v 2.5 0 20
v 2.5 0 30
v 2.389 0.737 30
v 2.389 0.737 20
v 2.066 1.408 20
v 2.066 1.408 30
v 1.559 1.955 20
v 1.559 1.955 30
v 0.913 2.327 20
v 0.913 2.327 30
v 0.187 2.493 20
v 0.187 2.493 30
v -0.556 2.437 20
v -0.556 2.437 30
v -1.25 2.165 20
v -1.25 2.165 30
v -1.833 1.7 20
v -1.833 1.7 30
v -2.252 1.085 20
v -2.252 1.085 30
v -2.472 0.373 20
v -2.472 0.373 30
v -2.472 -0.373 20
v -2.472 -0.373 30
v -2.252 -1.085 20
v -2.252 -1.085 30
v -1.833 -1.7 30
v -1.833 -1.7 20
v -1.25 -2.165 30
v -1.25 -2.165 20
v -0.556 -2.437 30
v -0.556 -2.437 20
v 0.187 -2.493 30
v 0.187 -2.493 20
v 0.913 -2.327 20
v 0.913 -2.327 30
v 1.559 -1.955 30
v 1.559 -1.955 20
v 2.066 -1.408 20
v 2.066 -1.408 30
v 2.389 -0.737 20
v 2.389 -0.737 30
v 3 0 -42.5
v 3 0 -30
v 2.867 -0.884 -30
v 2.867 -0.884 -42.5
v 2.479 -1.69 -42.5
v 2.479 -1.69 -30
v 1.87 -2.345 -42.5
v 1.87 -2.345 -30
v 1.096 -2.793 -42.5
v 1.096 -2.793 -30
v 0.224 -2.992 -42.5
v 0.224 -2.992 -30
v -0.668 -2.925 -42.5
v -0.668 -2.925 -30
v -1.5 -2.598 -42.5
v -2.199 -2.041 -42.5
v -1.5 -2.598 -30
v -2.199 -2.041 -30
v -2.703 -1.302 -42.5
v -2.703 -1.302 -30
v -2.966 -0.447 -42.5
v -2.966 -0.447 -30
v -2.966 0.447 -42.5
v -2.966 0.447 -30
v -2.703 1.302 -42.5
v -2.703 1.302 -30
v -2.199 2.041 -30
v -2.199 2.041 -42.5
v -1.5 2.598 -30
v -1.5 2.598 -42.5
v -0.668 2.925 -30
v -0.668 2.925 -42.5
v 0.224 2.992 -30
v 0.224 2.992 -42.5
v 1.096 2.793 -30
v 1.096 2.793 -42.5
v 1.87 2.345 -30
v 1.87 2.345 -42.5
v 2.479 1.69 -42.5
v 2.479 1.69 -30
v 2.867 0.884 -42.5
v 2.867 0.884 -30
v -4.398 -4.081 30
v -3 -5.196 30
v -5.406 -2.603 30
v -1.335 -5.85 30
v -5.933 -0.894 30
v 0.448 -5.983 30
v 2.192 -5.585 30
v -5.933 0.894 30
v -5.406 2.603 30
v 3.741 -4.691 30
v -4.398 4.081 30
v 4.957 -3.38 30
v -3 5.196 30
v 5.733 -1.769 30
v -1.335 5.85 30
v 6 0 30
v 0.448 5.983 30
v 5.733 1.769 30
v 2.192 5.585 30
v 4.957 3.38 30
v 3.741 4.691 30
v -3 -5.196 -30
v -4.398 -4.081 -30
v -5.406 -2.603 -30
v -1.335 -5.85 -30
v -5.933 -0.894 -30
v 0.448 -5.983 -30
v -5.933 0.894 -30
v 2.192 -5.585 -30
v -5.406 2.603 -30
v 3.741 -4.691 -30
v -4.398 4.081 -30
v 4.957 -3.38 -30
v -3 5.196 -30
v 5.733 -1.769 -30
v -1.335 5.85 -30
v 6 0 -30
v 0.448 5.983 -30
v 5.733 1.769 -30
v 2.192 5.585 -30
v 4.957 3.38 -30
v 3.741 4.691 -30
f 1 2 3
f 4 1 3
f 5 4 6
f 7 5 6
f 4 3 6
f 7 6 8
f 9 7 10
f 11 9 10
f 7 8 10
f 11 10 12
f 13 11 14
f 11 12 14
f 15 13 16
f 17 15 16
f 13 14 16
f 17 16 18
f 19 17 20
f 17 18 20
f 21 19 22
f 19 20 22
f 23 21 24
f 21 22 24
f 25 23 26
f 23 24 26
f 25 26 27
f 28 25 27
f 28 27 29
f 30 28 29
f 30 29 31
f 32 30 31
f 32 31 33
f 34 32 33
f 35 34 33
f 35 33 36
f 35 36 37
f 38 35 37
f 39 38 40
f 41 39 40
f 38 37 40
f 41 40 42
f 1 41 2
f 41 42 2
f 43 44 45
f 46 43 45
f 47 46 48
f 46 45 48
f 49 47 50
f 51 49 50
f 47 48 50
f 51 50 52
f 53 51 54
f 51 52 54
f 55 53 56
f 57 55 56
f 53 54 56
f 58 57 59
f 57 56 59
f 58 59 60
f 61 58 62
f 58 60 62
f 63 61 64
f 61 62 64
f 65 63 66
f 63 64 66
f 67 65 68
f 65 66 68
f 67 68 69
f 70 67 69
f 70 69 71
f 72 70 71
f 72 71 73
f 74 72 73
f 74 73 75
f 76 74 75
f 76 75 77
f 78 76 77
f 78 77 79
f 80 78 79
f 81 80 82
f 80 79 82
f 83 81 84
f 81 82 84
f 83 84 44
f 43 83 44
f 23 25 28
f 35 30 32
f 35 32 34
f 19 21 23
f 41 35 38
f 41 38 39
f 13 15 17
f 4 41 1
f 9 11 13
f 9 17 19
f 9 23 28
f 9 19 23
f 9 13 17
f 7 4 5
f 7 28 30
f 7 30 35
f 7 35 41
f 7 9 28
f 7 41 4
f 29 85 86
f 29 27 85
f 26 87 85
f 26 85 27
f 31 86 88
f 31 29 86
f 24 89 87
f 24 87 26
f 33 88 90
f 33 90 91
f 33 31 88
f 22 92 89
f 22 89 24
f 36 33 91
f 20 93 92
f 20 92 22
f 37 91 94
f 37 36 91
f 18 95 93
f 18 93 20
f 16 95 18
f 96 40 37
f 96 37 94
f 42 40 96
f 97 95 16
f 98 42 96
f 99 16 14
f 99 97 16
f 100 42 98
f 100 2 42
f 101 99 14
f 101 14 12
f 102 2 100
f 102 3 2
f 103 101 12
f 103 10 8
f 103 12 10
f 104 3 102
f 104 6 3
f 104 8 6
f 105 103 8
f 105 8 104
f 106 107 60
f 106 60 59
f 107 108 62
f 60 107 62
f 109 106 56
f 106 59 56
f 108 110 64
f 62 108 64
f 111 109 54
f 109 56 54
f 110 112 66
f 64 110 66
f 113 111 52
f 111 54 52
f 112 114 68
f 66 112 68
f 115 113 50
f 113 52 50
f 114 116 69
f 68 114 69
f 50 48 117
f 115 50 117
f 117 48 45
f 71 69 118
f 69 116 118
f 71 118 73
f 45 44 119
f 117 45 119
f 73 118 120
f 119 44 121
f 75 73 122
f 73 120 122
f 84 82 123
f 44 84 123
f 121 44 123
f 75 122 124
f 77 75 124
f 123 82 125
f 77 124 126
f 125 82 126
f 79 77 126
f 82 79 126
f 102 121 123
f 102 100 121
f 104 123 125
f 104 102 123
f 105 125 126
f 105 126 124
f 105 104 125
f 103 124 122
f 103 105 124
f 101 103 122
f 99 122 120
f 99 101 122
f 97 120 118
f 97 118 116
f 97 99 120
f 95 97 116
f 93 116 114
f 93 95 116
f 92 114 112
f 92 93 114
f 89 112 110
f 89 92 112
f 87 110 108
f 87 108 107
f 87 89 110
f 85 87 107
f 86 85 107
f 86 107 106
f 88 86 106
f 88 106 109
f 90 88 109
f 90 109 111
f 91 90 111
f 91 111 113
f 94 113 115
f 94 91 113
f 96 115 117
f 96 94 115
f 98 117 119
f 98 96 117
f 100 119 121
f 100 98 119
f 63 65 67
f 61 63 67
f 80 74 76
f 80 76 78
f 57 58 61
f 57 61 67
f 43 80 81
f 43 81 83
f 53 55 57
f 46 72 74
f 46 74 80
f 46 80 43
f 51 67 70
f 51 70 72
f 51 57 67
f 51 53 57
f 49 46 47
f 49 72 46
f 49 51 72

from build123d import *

# Parameters (mm, degrees)
SKETCH_1_R          = 6
EXTRUDE_1_DEPTH     = 30
SKETCH_2_R          = 3
EXTRUDE_2_DEPTH     = 12.5
SKETCH_4_R          = 2.5
CUT_EXTRUDE_1_DEPTH = 10


with BuildPart() as part:
    # 草图1 → 凸台-拉伸1 (new, symmetric)
    with BuildSketch(Plane.XY):
        Circle(SKETCH_1_R)
    extrude(amount=EXTRUDE_1_DEPTH, both=True)

    # 草图2 → 凸台-拉伸2 (add)
    with BuildSketch(Plane(origin=(0, 0, -30), x_dir=(-1, 0, 0), z_dir=(0, 0, -1))):
        with Locations(Location((0, 0, 0), (0, 0, 180))):
            Circle(SKETCH_2_R)
    extrude(amount=EXTRUDE_2_DEPTH)

    # 草图4 → 切除-拉伸1 (cut)
    with BuildSketch(Plane.XY.offset(30)):
        Circle(SKETCH_4_R)
    extrude(amount=-CUT_EXTRUDE_1_DEPTH, mode=Mode.SUBTRACT)


solid = part.part
